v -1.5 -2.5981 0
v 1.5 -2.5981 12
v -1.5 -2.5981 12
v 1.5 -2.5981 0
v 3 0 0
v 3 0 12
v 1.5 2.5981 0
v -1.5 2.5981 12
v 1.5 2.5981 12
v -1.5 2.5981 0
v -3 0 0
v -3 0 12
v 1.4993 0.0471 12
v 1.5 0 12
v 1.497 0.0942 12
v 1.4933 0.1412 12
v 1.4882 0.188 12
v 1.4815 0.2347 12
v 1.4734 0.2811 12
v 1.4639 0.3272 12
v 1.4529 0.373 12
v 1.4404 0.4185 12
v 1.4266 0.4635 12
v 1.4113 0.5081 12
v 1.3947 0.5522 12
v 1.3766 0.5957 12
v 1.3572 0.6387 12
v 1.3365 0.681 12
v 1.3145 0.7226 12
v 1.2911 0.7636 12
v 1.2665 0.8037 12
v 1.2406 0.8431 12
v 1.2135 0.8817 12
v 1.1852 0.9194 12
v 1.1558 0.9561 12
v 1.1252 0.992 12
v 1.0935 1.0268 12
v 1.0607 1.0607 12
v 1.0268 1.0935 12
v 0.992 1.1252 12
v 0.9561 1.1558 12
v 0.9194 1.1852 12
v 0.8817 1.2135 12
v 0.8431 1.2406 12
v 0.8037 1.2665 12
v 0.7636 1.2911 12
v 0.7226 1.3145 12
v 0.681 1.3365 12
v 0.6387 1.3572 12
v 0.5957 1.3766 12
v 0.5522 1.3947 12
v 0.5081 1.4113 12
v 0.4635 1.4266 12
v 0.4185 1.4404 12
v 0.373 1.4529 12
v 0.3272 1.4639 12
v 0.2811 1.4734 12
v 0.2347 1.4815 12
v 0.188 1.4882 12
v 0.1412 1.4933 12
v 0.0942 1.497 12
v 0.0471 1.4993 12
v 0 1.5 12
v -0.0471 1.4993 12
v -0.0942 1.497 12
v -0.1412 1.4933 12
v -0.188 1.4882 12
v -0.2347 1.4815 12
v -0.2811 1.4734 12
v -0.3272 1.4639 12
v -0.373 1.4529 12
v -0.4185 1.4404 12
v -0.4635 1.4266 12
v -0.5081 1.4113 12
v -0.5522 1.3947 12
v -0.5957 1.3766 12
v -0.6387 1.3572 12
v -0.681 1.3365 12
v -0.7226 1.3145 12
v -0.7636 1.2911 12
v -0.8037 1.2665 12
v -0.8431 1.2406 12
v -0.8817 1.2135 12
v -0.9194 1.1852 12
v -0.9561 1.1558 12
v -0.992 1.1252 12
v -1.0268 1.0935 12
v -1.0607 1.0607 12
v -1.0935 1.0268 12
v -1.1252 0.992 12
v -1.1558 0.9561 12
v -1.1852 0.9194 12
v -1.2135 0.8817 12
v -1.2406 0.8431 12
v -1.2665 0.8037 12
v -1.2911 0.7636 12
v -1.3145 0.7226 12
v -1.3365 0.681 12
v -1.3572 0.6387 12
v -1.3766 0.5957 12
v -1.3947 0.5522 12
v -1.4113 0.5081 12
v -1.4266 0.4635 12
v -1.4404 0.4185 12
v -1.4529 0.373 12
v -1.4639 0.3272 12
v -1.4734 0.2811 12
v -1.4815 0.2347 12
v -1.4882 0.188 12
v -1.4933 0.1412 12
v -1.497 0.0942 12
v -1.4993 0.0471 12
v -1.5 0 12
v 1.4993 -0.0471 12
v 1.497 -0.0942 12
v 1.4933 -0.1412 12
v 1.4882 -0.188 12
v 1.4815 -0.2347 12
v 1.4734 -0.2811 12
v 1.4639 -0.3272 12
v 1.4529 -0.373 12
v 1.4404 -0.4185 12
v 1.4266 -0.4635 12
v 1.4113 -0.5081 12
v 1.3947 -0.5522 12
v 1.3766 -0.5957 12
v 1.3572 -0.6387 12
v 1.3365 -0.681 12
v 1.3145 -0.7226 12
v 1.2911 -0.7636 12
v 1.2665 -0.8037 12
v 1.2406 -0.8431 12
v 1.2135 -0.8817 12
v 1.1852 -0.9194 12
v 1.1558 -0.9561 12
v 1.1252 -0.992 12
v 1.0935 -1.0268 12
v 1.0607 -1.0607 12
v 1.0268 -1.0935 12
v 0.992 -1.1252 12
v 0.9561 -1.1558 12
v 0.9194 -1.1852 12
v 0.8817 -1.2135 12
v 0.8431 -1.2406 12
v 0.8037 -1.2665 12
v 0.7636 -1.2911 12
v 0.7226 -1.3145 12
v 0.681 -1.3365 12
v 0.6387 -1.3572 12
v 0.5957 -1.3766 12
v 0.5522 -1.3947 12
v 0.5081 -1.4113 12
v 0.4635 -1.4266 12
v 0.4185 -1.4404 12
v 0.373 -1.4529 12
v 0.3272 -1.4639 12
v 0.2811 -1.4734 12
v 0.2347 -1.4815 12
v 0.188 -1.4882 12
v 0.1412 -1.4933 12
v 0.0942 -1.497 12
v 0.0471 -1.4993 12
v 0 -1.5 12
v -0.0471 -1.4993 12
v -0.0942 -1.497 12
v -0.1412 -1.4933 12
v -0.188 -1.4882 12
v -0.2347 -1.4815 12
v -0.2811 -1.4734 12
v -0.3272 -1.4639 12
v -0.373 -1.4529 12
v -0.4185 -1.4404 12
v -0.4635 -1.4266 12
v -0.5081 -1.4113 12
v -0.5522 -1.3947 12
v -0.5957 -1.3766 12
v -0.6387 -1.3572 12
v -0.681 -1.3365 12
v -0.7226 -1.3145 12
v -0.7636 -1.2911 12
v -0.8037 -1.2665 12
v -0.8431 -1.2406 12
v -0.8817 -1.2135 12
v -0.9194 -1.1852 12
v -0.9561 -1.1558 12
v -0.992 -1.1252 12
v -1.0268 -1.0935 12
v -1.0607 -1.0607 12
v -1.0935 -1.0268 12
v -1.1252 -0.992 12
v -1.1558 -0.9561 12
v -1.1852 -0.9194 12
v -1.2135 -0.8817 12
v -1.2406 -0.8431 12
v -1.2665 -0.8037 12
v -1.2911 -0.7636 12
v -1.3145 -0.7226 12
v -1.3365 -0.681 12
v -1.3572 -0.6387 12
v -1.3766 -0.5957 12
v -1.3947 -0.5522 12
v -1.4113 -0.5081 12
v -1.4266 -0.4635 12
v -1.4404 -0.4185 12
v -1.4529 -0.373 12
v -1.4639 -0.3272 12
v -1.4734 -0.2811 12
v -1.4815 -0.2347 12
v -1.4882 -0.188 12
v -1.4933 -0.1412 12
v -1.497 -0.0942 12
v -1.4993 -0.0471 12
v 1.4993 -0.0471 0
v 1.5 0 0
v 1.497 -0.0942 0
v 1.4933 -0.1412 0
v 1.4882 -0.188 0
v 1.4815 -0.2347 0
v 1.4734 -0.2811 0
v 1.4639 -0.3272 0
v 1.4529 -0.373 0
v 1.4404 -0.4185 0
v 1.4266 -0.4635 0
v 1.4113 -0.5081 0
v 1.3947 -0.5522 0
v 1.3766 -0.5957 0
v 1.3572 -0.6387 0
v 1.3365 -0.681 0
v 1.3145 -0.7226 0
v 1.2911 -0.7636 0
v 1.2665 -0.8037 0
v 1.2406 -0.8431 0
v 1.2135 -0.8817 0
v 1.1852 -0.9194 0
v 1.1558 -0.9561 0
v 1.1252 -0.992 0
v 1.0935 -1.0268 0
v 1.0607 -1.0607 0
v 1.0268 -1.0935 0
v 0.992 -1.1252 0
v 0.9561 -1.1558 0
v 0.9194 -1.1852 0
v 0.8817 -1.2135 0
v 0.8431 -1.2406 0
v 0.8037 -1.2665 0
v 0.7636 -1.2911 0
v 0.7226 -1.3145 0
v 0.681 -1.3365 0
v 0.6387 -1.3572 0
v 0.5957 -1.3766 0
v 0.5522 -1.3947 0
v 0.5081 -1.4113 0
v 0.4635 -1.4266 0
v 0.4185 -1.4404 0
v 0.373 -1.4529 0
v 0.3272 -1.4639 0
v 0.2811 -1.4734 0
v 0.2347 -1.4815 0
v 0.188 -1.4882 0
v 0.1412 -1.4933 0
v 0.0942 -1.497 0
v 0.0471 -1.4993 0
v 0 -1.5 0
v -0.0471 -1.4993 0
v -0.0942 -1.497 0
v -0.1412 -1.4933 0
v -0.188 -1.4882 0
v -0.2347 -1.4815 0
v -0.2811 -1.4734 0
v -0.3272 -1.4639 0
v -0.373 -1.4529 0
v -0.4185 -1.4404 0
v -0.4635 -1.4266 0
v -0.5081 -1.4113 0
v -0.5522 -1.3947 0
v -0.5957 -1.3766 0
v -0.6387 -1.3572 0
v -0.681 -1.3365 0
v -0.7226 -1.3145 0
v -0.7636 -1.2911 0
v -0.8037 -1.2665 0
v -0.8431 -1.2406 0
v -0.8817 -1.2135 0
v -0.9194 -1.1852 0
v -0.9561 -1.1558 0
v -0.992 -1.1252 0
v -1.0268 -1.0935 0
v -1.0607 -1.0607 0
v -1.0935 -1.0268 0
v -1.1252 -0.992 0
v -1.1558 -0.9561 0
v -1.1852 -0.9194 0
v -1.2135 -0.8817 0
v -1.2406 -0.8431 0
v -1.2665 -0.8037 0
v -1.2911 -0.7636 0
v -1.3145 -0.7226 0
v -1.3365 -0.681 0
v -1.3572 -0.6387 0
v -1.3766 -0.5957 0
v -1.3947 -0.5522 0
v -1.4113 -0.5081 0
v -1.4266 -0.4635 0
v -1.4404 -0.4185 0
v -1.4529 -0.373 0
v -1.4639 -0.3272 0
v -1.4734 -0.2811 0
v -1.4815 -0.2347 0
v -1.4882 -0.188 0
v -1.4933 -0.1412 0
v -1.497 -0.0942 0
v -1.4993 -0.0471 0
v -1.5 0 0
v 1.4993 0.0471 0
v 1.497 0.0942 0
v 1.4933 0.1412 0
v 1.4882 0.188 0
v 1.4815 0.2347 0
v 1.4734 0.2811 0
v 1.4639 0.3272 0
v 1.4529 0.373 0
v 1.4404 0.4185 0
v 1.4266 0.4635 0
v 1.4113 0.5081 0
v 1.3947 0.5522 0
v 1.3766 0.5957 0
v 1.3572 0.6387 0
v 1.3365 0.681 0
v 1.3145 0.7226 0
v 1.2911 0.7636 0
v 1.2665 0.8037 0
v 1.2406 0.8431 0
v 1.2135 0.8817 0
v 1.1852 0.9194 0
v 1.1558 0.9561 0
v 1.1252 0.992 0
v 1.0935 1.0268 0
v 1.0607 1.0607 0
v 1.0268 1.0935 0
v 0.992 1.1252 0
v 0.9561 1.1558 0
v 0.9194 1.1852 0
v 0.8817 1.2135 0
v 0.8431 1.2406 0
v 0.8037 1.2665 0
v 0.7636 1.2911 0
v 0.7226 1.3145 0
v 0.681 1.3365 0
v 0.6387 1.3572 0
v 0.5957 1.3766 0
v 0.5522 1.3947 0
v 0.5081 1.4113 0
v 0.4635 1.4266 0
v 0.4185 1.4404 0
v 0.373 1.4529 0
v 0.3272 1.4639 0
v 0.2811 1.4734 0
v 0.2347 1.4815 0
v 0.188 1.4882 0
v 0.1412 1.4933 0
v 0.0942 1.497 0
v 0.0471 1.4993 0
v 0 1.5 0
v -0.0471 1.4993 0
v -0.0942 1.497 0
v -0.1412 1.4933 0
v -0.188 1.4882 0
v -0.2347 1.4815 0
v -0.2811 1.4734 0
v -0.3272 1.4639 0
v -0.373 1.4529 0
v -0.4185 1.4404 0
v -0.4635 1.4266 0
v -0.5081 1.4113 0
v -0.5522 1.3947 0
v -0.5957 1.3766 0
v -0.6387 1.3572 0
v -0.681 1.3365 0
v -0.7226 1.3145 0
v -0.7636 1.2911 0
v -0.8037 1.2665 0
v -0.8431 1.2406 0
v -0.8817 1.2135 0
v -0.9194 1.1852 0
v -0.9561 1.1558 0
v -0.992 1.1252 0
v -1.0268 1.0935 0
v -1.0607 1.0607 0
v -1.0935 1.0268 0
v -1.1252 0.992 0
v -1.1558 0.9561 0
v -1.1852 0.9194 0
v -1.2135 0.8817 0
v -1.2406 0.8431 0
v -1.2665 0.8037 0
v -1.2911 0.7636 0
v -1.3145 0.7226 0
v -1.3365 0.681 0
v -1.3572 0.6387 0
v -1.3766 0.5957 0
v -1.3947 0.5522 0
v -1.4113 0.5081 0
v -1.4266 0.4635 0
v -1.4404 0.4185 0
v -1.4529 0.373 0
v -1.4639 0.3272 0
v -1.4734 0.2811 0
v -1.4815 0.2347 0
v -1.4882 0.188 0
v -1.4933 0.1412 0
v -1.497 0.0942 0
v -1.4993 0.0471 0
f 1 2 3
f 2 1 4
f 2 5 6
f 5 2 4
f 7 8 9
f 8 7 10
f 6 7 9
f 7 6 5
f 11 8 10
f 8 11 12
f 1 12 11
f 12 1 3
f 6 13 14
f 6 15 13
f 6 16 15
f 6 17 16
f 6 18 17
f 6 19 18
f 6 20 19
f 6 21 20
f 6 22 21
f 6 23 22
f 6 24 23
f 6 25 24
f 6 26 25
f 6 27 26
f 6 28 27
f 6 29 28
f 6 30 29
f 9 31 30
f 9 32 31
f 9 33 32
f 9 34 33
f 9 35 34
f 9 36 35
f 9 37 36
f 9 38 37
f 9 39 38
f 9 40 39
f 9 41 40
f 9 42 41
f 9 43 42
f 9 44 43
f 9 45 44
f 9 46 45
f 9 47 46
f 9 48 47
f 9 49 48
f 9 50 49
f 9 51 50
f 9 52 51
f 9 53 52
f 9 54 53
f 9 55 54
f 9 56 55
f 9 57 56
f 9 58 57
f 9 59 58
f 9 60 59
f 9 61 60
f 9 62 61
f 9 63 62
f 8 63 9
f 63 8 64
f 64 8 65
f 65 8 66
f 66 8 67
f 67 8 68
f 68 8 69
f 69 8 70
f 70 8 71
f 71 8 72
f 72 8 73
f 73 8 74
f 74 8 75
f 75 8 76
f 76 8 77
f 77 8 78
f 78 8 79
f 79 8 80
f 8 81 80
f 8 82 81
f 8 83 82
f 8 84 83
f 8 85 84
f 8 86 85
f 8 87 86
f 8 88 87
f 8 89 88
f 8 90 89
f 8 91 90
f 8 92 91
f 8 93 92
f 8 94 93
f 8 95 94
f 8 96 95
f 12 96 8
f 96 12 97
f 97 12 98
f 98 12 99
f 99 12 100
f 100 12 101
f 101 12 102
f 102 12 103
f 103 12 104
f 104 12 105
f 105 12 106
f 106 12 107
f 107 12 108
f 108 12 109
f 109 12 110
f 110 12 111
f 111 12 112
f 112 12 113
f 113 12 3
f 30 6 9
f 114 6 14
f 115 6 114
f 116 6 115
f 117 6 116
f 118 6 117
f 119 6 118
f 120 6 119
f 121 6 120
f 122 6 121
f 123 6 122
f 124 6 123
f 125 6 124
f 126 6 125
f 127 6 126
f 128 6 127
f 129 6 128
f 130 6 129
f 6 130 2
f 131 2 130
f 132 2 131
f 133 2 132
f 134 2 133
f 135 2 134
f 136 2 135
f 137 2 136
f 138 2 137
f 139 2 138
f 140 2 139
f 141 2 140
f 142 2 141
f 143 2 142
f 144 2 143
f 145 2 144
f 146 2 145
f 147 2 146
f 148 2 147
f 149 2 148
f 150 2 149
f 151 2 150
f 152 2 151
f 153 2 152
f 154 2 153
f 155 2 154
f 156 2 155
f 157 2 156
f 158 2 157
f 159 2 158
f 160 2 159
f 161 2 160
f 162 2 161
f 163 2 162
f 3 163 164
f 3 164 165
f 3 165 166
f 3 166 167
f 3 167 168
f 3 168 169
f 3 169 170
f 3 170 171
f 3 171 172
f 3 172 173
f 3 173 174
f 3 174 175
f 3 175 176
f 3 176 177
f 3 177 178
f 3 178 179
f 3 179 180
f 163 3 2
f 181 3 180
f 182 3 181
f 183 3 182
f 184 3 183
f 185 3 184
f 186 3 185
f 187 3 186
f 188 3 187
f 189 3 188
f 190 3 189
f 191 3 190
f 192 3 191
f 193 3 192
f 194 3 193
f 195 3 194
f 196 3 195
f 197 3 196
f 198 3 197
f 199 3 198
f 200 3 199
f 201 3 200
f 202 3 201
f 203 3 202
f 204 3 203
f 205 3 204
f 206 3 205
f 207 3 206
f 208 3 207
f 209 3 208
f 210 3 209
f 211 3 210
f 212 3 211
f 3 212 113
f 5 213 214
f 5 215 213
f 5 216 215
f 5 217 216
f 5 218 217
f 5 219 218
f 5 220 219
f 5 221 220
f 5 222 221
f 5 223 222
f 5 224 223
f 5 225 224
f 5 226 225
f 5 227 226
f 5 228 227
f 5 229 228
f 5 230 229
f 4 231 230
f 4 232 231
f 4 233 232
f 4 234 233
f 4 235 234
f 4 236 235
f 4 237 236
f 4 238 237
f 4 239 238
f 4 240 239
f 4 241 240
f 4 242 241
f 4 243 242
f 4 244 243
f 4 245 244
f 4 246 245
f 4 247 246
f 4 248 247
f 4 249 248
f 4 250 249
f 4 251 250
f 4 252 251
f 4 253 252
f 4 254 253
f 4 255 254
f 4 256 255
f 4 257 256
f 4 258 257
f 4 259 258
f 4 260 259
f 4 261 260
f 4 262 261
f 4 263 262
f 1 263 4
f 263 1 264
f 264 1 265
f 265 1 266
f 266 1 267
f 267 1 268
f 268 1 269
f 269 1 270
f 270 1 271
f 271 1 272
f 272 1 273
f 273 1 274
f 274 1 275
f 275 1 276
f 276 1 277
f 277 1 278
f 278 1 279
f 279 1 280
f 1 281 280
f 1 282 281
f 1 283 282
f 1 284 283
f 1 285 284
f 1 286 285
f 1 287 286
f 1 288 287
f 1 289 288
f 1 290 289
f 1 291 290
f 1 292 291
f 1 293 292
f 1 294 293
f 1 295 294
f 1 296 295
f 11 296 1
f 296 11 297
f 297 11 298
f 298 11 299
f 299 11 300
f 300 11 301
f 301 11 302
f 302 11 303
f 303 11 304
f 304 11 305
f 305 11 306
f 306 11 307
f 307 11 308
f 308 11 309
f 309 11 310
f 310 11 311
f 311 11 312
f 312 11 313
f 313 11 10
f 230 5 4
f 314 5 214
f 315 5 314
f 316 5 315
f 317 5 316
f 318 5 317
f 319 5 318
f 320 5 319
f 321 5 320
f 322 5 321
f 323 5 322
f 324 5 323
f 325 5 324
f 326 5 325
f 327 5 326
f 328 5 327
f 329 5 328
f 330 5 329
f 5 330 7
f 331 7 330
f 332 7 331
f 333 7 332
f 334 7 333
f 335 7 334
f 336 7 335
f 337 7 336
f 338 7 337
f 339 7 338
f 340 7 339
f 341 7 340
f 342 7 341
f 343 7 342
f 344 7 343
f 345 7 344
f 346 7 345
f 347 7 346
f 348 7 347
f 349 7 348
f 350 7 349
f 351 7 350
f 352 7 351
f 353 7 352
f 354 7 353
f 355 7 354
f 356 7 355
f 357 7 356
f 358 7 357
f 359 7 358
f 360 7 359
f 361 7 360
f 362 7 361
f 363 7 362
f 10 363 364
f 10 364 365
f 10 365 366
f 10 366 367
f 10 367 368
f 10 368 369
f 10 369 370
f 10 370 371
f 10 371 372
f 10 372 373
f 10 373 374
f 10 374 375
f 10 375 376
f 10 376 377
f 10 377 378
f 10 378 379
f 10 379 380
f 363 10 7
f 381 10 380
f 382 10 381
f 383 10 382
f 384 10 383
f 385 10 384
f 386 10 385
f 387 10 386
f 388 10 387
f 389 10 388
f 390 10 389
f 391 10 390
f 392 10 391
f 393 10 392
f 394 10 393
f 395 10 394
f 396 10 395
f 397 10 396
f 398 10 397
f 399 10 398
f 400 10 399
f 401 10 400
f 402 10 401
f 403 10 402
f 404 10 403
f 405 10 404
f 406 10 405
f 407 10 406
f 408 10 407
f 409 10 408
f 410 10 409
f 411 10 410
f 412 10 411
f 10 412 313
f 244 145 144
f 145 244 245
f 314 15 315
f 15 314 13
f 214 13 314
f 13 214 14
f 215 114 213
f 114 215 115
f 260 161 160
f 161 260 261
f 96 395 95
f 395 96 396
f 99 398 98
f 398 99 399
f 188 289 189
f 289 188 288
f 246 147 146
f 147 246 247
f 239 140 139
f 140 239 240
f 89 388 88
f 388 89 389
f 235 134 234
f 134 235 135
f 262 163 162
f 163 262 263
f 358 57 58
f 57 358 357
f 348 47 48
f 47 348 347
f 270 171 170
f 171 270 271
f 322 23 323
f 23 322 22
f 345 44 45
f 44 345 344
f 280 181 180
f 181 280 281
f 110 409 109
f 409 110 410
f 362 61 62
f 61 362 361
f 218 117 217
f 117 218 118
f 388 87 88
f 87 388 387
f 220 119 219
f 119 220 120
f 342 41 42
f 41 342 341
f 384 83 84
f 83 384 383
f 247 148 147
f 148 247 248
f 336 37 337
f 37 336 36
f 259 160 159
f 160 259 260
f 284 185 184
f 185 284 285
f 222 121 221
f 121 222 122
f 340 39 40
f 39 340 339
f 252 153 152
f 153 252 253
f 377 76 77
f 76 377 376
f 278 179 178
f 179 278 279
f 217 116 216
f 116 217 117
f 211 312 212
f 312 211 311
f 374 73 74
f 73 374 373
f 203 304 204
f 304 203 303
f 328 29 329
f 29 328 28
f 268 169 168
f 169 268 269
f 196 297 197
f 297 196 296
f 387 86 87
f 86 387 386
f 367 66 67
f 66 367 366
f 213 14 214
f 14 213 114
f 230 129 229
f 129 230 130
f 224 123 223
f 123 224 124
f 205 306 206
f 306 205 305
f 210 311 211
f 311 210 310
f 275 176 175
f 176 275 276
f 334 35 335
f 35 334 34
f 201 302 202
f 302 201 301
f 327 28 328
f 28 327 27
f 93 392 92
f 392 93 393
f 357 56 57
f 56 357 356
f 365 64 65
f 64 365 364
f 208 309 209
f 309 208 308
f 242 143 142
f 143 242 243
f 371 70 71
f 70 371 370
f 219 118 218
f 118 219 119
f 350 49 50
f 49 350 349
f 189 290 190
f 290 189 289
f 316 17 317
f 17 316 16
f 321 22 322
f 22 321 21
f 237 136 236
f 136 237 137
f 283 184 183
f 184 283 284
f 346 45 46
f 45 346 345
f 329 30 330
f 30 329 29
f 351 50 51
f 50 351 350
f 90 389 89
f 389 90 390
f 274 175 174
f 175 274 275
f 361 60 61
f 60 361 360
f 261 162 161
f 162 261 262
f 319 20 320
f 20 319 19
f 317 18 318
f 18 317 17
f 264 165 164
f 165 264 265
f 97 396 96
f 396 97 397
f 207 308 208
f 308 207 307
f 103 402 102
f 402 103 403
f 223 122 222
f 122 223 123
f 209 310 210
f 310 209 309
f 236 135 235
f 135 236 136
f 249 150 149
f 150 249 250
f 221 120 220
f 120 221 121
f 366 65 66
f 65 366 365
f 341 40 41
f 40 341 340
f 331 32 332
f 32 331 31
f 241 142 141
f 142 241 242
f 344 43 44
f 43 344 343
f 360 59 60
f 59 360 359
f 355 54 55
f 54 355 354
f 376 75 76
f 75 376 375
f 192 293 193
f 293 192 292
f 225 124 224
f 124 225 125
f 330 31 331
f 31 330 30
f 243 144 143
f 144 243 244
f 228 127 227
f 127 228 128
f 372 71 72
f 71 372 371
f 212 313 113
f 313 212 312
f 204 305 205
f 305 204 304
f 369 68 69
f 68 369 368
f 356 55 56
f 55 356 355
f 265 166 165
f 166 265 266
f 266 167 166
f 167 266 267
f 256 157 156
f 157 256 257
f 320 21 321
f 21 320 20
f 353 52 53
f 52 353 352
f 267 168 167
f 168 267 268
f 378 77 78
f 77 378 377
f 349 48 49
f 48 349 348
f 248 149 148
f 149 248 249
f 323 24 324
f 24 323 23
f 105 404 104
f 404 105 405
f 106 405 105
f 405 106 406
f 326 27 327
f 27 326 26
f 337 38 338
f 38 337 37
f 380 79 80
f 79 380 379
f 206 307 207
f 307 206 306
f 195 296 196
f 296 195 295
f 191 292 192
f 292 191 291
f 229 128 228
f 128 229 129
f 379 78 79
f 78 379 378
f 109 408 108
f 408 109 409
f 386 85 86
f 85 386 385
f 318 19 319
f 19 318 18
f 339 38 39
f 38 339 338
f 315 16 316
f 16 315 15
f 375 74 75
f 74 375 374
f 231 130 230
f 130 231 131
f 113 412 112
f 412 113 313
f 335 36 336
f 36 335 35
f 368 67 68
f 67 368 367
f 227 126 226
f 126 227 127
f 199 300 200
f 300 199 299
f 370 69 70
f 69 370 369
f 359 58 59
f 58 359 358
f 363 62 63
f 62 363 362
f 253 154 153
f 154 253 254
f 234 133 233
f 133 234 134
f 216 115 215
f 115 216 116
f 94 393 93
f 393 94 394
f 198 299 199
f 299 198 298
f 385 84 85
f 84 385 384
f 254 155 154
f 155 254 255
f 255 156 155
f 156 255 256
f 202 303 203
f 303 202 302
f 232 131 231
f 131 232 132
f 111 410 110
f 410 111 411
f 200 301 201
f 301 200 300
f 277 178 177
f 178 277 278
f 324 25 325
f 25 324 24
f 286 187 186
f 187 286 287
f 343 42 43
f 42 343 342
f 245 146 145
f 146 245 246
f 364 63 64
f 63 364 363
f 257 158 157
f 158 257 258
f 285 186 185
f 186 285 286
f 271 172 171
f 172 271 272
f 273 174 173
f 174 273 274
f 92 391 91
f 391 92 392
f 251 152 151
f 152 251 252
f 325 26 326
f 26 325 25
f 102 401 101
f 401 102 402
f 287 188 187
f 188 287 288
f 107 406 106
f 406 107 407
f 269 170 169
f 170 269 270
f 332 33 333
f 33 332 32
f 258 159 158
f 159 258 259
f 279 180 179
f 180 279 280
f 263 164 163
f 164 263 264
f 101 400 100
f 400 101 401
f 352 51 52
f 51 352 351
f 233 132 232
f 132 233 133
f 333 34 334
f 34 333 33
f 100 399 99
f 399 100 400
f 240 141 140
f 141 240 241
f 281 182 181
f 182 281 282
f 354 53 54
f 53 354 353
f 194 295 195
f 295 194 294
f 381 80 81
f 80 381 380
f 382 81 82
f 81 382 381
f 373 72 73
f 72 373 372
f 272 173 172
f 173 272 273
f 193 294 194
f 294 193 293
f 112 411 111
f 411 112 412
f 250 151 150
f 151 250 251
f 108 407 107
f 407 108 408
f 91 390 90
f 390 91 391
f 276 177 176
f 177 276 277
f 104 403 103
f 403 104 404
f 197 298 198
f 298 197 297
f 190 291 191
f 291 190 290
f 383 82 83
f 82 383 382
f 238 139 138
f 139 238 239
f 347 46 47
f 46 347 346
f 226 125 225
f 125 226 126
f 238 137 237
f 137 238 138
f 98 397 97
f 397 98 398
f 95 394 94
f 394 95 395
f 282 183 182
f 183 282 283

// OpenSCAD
/*
    Federico Ramos
    Guanajuato Mexico
    Basic config for a spacer
*/
//measurements in mm!
intDiam=3;  
outDiam=6;  
height=12;
 
/*
    Specs for a M3 spacer:
    intDiam=3;
    outDiam=6;
*/
 
difference(){
    cylinder(r=outDiam/2,h=height,$fn=6);
    cylinder(r=intDiam/2,h=height,$fn=200);
}
